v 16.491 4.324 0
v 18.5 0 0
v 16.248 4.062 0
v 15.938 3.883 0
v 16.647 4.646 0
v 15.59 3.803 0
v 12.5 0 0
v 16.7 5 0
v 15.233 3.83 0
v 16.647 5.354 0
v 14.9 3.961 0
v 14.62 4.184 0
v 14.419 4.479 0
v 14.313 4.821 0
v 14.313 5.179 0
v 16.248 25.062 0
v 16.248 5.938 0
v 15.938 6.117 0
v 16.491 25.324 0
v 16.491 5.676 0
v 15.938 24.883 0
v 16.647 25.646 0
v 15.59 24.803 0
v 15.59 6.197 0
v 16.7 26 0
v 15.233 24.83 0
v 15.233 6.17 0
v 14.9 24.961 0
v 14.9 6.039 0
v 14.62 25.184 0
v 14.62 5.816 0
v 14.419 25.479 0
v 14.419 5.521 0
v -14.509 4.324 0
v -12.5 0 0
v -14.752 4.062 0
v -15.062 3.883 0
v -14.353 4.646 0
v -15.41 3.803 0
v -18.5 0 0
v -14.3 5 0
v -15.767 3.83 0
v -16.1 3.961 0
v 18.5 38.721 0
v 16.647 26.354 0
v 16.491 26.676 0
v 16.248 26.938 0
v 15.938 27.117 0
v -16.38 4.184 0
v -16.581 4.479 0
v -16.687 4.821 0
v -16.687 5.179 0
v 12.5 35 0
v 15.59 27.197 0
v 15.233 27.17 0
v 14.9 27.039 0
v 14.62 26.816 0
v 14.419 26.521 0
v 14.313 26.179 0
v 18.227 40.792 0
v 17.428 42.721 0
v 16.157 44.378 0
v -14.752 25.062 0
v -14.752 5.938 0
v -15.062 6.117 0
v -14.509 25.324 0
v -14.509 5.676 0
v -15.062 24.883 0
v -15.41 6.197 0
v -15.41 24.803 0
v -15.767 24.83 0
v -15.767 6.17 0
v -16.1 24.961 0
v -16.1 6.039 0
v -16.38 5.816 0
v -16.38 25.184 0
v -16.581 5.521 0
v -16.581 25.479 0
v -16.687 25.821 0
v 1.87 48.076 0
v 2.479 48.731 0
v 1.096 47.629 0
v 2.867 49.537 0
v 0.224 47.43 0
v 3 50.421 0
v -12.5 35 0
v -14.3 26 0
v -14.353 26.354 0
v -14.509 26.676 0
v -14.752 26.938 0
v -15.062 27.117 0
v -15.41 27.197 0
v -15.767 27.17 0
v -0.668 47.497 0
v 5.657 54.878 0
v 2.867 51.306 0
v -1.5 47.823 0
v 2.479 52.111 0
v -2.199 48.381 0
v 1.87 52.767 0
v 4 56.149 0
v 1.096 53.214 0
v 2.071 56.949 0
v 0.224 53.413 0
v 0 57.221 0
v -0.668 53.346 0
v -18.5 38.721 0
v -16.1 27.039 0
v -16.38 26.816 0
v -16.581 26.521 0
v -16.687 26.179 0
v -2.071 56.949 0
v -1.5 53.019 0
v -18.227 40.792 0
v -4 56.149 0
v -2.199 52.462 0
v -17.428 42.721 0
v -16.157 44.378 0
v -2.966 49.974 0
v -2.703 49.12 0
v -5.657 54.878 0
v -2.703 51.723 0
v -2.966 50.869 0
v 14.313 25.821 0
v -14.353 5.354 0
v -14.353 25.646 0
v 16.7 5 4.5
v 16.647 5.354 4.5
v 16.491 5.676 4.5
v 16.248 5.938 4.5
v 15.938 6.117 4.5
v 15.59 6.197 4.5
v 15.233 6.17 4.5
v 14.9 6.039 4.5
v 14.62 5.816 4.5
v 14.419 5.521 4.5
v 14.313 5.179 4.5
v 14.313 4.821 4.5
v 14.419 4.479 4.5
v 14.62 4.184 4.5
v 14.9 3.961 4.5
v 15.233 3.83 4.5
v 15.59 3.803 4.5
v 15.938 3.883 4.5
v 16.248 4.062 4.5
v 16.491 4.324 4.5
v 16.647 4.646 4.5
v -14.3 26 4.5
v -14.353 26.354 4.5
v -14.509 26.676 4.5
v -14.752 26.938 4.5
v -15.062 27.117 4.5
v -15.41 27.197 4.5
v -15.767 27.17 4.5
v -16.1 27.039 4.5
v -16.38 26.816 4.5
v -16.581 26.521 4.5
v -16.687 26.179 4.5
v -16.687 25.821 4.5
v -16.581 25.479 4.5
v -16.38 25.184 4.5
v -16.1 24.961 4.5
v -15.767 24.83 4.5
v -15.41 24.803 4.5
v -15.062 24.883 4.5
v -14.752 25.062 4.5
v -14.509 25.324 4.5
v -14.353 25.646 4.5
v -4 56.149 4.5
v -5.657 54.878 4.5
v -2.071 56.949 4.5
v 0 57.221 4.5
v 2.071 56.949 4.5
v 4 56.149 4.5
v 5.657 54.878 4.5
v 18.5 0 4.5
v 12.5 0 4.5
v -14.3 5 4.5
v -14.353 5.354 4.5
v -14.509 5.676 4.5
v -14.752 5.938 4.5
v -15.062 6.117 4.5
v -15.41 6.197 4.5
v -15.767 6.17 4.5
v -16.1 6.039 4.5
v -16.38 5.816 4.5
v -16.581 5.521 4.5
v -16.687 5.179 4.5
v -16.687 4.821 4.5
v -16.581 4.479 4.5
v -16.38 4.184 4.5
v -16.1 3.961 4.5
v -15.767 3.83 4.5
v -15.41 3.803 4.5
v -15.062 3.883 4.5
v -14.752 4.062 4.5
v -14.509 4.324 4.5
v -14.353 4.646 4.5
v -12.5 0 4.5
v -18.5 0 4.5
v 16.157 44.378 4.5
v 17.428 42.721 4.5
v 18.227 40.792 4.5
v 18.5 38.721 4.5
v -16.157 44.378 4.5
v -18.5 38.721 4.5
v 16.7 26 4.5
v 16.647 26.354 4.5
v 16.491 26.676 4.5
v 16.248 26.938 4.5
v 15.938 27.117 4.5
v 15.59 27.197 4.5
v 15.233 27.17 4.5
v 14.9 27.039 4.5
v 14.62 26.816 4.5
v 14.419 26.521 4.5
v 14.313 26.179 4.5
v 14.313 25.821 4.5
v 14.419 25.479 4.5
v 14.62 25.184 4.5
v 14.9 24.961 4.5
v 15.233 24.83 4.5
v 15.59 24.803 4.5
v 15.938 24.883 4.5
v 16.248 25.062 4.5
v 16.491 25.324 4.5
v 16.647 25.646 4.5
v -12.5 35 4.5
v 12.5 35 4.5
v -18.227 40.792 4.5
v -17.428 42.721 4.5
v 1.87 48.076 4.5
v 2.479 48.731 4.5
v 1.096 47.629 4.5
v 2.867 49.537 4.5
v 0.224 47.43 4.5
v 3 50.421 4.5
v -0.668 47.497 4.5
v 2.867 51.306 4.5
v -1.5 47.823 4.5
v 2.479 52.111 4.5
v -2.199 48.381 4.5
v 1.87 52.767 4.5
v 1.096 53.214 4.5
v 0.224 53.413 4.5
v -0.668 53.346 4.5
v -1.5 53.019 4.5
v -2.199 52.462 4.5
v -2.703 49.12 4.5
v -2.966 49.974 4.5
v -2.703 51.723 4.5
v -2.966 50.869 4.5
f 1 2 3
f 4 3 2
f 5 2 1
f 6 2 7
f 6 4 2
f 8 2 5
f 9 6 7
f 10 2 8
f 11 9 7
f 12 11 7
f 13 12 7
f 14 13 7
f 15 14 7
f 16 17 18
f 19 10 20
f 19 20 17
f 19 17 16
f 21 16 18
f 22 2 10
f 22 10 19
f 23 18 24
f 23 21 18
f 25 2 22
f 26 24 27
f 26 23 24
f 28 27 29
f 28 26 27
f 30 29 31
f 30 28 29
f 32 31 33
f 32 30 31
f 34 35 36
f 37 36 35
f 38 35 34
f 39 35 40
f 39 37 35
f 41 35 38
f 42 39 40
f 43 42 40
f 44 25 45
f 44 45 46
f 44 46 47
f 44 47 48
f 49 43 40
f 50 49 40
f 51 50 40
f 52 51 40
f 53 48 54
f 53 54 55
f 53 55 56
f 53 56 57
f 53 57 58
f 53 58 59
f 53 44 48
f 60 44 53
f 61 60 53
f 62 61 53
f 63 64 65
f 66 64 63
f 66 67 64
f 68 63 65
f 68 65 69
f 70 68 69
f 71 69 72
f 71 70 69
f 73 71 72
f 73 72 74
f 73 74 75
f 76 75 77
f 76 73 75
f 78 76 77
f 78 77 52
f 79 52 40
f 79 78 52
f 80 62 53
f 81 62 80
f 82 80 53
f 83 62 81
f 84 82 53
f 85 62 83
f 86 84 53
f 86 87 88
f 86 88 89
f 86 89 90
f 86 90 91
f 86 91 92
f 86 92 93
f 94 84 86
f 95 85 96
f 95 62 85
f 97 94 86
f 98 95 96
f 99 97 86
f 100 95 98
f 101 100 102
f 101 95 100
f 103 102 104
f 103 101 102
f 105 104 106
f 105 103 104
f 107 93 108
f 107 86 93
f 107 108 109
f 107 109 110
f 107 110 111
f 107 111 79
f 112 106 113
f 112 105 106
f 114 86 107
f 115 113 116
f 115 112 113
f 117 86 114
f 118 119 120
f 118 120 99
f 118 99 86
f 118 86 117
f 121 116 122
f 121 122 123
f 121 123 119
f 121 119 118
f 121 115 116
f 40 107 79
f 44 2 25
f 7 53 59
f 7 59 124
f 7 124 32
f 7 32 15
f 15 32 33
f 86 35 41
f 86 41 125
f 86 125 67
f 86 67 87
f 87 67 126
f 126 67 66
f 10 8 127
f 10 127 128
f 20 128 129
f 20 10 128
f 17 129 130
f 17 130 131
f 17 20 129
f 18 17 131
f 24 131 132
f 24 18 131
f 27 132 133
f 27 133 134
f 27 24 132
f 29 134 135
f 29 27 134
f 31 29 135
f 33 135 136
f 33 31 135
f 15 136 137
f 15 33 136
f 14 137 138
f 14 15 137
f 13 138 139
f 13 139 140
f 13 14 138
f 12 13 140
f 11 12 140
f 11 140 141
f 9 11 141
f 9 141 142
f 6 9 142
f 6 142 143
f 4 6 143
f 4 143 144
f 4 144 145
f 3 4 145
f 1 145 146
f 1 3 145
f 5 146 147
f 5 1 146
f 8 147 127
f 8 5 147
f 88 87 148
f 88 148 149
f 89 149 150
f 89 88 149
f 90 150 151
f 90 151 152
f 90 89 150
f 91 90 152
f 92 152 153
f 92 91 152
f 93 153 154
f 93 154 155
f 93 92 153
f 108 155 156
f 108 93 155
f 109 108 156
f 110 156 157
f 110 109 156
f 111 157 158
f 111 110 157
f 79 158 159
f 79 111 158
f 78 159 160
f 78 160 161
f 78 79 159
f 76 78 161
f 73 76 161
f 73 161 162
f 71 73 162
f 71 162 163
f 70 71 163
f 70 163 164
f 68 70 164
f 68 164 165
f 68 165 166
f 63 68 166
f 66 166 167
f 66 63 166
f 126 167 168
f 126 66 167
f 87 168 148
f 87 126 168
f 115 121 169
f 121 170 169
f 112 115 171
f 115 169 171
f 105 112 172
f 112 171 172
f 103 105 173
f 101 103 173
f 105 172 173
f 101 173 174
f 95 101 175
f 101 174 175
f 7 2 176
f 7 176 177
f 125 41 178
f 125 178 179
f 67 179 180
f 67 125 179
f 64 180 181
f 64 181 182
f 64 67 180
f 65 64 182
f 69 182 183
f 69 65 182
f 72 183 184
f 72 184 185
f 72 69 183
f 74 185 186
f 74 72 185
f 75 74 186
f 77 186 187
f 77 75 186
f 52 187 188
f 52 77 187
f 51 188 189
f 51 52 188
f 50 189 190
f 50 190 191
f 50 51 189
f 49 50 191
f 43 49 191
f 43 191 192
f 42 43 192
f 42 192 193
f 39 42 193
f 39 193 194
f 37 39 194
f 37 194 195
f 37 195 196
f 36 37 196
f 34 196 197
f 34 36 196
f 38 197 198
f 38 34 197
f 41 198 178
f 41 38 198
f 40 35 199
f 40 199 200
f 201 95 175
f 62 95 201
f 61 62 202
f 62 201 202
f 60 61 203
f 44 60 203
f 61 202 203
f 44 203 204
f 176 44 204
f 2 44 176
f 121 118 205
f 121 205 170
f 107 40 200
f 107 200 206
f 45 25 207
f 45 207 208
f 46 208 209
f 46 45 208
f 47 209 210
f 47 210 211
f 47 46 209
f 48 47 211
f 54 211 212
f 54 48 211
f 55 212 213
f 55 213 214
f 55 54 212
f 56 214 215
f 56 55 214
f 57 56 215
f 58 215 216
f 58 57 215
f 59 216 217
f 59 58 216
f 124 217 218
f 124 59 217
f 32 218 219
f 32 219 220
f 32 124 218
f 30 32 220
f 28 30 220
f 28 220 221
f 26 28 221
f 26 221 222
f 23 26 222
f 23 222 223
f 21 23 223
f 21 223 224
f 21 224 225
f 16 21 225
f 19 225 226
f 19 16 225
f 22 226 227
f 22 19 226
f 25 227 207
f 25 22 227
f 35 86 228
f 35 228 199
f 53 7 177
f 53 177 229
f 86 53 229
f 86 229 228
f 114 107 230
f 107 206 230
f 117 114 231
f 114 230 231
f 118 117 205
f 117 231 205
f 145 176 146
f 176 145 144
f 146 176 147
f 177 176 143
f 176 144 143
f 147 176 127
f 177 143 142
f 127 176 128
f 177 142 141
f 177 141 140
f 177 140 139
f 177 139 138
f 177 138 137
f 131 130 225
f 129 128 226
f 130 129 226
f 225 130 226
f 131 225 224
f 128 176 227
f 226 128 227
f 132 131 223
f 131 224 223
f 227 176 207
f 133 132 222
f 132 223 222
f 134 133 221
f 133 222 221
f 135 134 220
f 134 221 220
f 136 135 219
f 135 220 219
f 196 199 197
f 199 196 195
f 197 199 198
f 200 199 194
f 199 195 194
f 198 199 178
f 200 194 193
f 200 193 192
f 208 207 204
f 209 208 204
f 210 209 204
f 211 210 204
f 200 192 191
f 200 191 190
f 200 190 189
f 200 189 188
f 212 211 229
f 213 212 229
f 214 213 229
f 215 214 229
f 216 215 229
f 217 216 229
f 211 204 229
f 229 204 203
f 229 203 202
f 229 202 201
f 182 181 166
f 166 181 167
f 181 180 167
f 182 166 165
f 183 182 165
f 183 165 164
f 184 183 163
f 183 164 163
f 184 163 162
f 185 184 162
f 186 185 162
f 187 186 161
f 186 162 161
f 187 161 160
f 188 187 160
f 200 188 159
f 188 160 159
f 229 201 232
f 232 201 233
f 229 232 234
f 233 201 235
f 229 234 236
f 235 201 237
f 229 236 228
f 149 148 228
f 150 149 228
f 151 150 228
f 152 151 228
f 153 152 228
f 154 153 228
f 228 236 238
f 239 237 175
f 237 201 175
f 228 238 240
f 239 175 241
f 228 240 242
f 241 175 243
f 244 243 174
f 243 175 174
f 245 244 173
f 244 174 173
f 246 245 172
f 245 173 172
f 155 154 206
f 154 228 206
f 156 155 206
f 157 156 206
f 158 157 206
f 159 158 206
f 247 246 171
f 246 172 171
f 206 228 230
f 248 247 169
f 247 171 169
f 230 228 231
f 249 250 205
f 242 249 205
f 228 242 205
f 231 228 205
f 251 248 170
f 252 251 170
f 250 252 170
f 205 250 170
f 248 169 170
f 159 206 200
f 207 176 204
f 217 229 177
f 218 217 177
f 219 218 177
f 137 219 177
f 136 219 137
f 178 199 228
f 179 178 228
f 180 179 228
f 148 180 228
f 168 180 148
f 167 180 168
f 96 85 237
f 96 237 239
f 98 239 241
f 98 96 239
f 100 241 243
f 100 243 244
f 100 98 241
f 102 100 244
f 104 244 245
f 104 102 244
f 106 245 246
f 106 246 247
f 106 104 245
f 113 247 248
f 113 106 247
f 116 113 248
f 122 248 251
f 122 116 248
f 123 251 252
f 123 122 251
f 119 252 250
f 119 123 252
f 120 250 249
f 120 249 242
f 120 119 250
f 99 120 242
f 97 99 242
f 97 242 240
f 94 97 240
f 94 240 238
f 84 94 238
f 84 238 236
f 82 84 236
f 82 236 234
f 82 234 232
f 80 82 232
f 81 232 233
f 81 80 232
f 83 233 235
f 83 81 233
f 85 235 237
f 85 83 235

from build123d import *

# Parameters (mm, degrees)
SKETCH_1_R      = 3
SKETCH_1_R_2    = 1.2
EXTRUDE_1_DEPTH = 4.5
FILLET_1_R      = 8


with BuildPart() as part:
    # 草图1 → 凸台-拉伸1 (new body)
    with BuildSketch(Plane.XY):
        Polygon((-12.5, 0), (-18.5, 0), (-18.5, 42.034916596), (0, 60.534916596), (18.5, 42.034916596), (18.5, 0), (12.5, 0), (12.5, 35), (-12.5, 35), align=None)
        with Locations((0, 50.421397557)):
            Circle(SKETCH_1_R, mode=Mode.SUBTRACT)
        with Locations((-15.5, 5)):
            Circle(SKETCH_1_R_2, mode=Mode.SUBTRACT)
        with Locations((-15.5, 26)):
            Circle(SKETCH_1_R_2, mode=Mode.SUBTRACT)
        with Locations((15.5, 5)):
            Circle(SKETCH_1_R_2, mode=Mode.SUBTRACT)
        with Locations((15.5, 26)):
            Circle(SKETCH_1_R_2, mode=Mode.SUBTRACT)
    extrude(amount=EXTRUDE_1_DEPTH)

    # 圆角1
    fillet_1_edges = [part.edges().sort_by_distance(p)[0] for p in [
        (-18.5, 42.034916596, 2.25),
        (0, 60.534916596, 2.25),
        (18.5, 42.034916596, 2.25),
    ]]
    fillet(fillet_1_edges, radius=FILLET_1_R)


solid = part.part
